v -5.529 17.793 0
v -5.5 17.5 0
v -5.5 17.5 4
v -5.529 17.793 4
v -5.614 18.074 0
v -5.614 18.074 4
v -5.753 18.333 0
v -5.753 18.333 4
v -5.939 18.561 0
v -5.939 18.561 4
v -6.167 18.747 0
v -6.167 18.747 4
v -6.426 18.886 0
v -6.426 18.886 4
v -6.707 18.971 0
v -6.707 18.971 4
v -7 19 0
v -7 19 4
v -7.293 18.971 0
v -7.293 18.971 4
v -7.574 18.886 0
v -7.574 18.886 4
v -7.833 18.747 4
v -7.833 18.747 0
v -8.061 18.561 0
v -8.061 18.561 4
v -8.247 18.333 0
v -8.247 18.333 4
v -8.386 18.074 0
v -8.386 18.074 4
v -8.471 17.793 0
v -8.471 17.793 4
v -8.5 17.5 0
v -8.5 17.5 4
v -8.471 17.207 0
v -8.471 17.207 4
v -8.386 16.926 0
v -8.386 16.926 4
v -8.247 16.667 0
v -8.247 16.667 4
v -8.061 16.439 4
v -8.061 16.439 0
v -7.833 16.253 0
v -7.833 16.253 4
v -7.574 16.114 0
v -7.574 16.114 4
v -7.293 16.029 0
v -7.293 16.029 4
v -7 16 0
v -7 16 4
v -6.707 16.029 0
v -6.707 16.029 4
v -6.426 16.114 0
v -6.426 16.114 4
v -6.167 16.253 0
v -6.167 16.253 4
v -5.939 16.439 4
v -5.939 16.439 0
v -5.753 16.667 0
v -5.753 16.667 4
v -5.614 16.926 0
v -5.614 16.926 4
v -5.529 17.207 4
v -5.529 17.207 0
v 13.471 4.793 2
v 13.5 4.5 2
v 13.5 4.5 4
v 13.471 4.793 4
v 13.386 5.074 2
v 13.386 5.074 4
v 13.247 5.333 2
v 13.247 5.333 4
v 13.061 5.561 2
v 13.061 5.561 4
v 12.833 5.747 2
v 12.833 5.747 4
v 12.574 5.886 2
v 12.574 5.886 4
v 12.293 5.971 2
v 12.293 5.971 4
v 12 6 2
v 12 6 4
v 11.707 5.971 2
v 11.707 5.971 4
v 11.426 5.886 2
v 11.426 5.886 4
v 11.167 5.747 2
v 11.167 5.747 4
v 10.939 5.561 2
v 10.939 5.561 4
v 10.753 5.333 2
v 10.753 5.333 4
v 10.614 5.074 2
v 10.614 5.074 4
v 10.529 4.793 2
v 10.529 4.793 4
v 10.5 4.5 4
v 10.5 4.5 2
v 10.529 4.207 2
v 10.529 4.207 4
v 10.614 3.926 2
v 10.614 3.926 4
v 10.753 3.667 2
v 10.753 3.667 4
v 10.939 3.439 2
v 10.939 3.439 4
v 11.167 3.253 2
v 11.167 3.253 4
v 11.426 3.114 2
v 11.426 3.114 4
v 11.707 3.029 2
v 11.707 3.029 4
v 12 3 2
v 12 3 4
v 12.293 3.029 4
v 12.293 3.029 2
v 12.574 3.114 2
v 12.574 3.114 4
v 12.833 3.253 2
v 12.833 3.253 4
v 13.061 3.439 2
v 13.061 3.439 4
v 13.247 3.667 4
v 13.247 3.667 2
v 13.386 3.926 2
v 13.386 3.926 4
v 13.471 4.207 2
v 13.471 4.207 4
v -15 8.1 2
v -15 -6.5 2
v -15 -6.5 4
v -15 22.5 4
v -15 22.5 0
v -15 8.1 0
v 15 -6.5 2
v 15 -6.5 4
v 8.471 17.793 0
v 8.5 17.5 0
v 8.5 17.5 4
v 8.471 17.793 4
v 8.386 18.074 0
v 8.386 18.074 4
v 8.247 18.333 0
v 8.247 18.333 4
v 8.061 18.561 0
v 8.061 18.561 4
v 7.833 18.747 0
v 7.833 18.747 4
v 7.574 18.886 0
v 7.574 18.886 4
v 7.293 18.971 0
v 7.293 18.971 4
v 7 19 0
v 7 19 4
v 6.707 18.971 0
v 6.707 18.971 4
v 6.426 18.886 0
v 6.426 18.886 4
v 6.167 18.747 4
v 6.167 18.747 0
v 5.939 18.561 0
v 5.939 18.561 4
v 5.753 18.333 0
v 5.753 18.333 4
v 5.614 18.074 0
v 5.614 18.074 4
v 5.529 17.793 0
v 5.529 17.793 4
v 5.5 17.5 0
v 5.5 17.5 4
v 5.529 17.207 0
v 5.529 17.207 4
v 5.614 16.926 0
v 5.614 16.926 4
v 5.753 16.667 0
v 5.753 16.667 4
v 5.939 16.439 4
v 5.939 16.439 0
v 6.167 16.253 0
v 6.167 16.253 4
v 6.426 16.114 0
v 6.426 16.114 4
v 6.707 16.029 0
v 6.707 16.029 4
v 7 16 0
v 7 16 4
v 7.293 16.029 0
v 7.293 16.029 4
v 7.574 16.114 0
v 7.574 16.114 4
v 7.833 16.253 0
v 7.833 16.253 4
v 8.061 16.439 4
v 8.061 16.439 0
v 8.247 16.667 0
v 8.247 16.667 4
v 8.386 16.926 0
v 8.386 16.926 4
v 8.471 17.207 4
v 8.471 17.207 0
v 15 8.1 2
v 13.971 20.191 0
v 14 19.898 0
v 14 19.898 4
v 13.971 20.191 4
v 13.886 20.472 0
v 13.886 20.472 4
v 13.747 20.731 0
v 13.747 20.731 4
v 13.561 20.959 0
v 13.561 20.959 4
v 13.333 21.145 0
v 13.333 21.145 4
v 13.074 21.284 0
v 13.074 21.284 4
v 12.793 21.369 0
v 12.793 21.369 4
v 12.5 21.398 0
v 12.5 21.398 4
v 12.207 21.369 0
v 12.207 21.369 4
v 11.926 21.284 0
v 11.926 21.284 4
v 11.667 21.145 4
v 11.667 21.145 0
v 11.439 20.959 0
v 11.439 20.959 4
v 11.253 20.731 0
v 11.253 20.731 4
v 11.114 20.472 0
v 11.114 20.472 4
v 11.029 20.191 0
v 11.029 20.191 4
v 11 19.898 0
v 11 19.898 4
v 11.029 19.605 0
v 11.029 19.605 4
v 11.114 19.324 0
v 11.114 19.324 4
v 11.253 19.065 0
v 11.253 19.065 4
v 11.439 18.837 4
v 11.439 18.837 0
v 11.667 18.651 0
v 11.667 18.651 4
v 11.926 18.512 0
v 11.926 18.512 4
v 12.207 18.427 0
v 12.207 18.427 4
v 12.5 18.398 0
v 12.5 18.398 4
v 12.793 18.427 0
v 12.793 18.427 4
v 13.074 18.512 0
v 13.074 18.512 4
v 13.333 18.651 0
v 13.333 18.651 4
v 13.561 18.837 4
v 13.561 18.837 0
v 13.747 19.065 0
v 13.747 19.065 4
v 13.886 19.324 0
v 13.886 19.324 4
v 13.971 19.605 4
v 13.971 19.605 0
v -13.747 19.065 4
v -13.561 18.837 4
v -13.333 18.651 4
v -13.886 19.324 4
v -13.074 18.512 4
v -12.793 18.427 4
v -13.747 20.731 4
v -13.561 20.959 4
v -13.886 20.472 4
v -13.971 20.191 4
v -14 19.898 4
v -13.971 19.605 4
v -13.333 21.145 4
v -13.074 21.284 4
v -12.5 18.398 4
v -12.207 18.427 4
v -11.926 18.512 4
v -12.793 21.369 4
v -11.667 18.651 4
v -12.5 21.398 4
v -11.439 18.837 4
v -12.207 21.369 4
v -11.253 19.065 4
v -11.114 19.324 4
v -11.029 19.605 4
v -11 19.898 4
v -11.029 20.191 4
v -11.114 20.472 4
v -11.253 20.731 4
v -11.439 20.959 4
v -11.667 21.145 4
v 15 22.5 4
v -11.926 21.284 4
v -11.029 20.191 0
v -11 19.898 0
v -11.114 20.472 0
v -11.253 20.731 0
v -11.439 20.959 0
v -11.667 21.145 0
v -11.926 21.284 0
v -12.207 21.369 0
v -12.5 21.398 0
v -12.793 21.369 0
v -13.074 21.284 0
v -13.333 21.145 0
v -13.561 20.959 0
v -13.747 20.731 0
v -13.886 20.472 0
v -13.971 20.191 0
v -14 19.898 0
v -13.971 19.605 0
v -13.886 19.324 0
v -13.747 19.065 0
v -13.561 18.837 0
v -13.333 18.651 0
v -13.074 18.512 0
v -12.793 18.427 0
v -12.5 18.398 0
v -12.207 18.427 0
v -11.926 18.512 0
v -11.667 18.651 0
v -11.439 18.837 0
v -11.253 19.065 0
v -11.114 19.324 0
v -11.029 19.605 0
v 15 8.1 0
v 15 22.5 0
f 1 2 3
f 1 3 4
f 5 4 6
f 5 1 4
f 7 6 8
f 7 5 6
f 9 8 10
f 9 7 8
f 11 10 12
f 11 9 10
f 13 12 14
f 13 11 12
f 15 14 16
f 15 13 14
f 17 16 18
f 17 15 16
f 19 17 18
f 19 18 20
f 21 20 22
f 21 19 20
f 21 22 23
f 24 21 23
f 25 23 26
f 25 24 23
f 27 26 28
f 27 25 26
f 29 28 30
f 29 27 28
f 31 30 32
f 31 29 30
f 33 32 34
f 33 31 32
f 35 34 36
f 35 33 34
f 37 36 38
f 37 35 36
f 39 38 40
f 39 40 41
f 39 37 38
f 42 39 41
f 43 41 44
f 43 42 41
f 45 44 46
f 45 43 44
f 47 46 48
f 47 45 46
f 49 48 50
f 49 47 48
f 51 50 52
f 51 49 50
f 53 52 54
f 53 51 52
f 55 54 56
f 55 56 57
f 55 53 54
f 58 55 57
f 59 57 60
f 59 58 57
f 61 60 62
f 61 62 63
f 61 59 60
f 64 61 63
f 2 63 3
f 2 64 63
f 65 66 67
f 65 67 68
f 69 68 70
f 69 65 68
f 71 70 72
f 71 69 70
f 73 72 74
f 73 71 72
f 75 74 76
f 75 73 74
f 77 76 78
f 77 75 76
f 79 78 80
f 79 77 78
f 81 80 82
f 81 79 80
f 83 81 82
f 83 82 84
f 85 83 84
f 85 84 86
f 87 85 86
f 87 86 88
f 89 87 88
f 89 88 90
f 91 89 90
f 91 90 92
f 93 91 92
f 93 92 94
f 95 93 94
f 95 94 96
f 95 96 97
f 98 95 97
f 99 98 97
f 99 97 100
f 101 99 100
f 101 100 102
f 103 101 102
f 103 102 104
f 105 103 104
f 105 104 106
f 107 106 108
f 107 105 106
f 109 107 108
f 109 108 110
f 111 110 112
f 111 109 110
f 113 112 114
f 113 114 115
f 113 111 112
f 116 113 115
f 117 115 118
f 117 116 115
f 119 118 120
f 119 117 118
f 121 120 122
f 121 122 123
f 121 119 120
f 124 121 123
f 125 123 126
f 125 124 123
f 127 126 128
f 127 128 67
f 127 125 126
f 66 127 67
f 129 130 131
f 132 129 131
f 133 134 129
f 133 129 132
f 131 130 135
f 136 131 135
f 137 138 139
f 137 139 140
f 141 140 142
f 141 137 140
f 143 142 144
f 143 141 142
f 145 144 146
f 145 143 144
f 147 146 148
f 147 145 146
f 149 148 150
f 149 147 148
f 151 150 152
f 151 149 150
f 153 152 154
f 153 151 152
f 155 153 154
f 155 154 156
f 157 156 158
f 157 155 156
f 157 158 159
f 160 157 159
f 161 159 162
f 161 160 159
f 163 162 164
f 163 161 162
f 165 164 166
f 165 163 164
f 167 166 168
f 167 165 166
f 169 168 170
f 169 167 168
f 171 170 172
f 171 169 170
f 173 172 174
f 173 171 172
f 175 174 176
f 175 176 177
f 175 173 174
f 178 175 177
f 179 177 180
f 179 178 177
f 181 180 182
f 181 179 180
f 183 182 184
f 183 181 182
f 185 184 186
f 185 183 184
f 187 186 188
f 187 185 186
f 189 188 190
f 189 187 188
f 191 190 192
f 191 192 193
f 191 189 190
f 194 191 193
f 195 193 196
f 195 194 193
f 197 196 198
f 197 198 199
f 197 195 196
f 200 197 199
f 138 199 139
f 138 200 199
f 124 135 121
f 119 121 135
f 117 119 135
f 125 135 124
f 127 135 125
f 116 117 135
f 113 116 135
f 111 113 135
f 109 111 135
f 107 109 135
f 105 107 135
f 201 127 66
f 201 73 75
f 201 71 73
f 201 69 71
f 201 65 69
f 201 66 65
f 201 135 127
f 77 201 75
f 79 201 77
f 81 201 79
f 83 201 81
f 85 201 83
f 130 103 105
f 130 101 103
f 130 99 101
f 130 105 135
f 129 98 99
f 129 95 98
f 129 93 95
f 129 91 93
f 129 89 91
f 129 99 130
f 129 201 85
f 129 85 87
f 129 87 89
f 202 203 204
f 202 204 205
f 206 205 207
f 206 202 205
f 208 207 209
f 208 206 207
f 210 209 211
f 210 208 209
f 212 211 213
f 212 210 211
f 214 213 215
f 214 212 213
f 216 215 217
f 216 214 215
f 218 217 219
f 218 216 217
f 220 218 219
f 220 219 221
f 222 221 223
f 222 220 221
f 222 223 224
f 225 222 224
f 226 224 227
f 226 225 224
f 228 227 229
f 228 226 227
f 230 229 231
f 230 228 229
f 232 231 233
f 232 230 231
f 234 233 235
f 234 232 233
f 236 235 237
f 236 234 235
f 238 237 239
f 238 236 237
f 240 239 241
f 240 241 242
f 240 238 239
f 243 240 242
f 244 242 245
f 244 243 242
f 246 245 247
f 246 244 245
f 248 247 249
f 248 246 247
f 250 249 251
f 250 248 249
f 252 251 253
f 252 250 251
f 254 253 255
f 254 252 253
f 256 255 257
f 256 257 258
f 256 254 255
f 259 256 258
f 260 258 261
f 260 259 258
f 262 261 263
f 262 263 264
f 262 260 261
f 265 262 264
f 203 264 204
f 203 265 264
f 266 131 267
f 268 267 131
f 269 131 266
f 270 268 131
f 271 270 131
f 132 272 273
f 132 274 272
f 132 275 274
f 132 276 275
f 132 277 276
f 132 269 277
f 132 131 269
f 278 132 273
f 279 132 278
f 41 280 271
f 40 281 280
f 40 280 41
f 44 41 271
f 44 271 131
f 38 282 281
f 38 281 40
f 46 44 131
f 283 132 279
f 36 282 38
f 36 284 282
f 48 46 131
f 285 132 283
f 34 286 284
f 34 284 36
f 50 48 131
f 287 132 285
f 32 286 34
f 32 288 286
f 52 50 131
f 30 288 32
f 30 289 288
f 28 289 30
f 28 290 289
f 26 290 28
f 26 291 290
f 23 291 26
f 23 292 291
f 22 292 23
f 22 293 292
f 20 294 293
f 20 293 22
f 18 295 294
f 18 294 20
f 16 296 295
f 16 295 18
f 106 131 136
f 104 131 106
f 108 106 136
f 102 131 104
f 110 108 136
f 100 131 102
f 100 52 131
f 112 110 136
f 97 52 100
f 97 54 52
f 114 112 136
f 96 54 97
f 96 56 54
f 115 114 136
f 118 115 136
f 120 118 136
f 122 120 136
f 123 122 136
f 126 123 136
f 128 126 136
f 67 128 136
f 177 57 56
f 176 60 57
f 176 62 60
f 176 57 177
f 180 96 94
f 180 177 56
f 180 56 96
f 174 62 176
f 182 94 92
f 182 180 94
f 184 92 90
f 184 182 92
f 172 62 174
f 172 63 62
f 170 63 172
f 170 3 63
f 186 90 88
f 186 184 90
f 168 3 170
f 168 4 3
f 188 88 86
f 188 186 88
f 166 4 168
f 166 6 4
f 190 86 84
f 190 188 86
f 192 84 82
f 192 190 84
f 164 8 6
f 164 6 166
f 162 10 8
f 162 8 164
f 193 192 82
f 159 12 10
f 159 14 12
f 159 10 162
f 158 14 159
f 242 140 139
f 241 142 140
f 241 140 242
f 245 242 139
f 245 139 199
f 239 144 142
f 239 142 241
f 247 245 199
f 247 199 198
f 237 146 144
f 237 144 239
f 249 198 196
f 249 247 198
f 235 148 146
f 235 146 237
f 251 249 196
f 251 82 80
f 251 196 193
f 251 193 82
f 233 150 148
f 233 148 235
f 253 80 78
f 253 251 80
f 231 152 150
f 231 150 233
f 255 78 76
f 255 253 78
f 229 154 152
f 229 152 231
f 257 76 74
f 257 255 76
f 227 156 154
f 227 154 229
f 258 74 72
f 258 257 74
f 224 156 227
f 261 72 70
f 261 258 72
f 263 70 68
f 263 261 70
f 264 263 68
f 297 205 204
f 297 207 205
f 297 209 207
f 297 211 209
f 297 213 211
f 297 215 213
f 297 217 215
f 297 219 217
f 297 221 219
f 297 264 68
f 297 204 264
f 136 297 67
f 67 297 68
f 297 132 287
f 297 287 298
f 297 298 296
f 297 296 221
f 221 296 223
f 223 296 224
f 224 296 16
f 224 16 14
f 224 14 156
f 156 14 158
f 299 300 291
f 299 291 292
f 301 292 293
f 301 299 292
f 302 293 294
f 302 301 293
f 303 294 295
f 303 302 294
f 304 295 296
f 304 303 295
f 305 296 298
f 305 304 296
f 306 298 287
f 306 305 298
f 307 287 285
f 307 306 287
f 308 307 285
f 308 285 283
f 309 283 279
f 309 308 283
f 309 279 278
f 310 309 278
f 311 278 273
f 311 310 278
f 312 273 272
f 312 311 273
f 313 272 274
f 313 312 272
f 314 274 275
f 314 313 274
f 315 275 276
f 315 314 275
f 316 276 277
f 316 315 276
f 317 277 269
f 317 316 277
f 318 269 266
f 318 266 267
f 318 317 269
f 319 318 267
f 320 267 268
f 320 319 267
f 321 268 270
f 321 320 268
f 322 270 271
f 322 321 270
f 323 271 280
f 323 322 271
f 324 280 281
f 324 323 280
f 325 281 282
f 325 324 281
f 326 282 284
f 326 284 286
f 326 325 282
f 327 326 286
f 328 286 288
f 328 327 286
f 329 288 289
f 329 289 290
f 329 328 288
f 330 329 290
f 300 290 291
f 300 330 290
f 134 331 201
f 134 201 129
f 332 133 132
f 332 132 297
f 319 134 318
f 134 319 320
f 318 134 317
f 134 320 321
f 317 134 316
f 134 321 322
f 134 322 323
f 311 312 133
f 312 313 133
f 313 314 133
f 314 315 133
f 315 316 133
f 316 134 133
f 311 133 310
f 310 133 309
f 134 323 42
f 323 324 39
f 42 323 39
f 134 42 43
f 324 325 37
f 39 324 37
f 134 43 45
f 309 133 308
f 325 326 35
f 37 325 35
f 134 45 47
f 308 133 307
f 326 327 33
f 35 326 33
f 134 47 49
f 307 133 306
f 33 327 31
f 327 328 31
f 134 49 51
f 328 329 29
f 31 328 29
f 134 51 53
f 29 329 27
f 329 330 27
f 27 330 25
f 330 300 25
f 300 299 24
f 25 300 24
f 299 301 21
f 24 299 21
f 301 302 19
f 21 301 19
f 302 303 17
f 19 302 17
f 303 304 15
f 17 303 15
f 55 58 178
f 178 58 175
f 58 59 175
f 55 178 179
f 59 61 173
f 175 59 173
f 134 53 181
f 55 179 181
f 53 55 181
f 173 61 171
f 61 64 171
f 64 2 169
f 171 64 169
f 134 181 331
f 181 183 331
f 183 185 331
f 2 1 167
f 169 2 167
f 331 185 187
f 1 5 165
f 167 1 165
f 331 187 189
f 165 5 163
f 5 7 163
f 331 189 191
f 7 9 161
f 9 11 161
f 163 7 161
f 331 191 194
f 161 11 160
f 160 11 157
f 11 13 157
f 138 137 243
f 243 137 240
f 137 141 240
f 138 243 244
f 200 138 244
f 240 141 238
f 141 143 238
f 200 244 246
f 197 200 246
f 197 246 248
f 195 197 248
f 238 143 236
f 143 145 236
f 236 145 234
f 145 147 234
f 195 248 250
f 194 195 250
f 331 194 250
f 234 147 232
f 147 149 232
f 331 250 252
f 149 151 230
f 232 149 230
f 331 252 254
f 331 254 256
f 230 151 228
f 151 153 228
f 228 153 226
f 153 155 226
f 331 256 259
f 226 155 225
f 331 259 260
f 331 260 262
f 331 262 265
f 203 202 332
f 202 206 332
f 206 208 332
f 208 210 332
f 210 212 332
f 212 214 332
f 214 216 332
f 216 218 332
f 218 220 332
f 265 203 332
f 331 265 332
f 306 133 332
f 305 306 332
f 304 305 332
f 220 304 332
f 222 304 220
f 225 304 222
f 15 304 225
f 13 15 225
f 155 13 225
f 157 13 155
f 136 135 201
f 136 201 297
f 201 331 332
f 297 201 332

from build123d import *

# Parameters (mm, degrees)
ESBO_O3_W                = 30
ESBO_O3_H                = 29
ESBO_O3_R                = 1.5
RESSALTO_EXTRUS_O2_DEPTH = 4
ESBO_O5_W                = 30
ESBO_O5_H                = 14.6
CORTE_EXTRUS_O2_DEPTH    = 2


with BuildPart() as part:
    # Esboço3 → Ressalto-extrusão2 (new body)
    with BuildSketch(Plane.XY):
        with Locations((0, 8)):
            Rectangle(ESBO_O3_W, ESBO_O3_H)
        with Locations((-12.5, 19.897915762)):
            Circle(ESBO_O3_R, mode=Mode.SUBTRACT)
        with Locations((-7, 17.5)):
            Circle(ESBO_O3_R, mode=Mode.SUBTRACT)
        with Locations((12, 4.5)):
            Circle(ESBO_O3_R, mode=Mode.SUBTRACT)
        with Locations((7, 17.5)):
            Circle(ESBO_O3_R, mode=Mode.SUBTRACT)
        with Locations((12.5, 19.897915762)):
            Circle(ESBO_O3_R, mode=Mode.SUBTRACT)
    extrude(amount=RESSALTO_EXTRUS_O2_DEPTH)

    # Esboço5 → Corte-extrusão2 (cut)
    with BuildSketch(Plane(origin=(0, 0, 0), x_dir=(-1, 0, 0), z_dir=(0, 0, -1))):
        with Locations((0, 0.8)):
            Rectangle(ESBO_O5_W, ESBO_O5_H)
    extrude(amount=-CORTE_EXTRUS_O2_DEPTH, mode=Mode.SUBTRACT)


solid = part.part
